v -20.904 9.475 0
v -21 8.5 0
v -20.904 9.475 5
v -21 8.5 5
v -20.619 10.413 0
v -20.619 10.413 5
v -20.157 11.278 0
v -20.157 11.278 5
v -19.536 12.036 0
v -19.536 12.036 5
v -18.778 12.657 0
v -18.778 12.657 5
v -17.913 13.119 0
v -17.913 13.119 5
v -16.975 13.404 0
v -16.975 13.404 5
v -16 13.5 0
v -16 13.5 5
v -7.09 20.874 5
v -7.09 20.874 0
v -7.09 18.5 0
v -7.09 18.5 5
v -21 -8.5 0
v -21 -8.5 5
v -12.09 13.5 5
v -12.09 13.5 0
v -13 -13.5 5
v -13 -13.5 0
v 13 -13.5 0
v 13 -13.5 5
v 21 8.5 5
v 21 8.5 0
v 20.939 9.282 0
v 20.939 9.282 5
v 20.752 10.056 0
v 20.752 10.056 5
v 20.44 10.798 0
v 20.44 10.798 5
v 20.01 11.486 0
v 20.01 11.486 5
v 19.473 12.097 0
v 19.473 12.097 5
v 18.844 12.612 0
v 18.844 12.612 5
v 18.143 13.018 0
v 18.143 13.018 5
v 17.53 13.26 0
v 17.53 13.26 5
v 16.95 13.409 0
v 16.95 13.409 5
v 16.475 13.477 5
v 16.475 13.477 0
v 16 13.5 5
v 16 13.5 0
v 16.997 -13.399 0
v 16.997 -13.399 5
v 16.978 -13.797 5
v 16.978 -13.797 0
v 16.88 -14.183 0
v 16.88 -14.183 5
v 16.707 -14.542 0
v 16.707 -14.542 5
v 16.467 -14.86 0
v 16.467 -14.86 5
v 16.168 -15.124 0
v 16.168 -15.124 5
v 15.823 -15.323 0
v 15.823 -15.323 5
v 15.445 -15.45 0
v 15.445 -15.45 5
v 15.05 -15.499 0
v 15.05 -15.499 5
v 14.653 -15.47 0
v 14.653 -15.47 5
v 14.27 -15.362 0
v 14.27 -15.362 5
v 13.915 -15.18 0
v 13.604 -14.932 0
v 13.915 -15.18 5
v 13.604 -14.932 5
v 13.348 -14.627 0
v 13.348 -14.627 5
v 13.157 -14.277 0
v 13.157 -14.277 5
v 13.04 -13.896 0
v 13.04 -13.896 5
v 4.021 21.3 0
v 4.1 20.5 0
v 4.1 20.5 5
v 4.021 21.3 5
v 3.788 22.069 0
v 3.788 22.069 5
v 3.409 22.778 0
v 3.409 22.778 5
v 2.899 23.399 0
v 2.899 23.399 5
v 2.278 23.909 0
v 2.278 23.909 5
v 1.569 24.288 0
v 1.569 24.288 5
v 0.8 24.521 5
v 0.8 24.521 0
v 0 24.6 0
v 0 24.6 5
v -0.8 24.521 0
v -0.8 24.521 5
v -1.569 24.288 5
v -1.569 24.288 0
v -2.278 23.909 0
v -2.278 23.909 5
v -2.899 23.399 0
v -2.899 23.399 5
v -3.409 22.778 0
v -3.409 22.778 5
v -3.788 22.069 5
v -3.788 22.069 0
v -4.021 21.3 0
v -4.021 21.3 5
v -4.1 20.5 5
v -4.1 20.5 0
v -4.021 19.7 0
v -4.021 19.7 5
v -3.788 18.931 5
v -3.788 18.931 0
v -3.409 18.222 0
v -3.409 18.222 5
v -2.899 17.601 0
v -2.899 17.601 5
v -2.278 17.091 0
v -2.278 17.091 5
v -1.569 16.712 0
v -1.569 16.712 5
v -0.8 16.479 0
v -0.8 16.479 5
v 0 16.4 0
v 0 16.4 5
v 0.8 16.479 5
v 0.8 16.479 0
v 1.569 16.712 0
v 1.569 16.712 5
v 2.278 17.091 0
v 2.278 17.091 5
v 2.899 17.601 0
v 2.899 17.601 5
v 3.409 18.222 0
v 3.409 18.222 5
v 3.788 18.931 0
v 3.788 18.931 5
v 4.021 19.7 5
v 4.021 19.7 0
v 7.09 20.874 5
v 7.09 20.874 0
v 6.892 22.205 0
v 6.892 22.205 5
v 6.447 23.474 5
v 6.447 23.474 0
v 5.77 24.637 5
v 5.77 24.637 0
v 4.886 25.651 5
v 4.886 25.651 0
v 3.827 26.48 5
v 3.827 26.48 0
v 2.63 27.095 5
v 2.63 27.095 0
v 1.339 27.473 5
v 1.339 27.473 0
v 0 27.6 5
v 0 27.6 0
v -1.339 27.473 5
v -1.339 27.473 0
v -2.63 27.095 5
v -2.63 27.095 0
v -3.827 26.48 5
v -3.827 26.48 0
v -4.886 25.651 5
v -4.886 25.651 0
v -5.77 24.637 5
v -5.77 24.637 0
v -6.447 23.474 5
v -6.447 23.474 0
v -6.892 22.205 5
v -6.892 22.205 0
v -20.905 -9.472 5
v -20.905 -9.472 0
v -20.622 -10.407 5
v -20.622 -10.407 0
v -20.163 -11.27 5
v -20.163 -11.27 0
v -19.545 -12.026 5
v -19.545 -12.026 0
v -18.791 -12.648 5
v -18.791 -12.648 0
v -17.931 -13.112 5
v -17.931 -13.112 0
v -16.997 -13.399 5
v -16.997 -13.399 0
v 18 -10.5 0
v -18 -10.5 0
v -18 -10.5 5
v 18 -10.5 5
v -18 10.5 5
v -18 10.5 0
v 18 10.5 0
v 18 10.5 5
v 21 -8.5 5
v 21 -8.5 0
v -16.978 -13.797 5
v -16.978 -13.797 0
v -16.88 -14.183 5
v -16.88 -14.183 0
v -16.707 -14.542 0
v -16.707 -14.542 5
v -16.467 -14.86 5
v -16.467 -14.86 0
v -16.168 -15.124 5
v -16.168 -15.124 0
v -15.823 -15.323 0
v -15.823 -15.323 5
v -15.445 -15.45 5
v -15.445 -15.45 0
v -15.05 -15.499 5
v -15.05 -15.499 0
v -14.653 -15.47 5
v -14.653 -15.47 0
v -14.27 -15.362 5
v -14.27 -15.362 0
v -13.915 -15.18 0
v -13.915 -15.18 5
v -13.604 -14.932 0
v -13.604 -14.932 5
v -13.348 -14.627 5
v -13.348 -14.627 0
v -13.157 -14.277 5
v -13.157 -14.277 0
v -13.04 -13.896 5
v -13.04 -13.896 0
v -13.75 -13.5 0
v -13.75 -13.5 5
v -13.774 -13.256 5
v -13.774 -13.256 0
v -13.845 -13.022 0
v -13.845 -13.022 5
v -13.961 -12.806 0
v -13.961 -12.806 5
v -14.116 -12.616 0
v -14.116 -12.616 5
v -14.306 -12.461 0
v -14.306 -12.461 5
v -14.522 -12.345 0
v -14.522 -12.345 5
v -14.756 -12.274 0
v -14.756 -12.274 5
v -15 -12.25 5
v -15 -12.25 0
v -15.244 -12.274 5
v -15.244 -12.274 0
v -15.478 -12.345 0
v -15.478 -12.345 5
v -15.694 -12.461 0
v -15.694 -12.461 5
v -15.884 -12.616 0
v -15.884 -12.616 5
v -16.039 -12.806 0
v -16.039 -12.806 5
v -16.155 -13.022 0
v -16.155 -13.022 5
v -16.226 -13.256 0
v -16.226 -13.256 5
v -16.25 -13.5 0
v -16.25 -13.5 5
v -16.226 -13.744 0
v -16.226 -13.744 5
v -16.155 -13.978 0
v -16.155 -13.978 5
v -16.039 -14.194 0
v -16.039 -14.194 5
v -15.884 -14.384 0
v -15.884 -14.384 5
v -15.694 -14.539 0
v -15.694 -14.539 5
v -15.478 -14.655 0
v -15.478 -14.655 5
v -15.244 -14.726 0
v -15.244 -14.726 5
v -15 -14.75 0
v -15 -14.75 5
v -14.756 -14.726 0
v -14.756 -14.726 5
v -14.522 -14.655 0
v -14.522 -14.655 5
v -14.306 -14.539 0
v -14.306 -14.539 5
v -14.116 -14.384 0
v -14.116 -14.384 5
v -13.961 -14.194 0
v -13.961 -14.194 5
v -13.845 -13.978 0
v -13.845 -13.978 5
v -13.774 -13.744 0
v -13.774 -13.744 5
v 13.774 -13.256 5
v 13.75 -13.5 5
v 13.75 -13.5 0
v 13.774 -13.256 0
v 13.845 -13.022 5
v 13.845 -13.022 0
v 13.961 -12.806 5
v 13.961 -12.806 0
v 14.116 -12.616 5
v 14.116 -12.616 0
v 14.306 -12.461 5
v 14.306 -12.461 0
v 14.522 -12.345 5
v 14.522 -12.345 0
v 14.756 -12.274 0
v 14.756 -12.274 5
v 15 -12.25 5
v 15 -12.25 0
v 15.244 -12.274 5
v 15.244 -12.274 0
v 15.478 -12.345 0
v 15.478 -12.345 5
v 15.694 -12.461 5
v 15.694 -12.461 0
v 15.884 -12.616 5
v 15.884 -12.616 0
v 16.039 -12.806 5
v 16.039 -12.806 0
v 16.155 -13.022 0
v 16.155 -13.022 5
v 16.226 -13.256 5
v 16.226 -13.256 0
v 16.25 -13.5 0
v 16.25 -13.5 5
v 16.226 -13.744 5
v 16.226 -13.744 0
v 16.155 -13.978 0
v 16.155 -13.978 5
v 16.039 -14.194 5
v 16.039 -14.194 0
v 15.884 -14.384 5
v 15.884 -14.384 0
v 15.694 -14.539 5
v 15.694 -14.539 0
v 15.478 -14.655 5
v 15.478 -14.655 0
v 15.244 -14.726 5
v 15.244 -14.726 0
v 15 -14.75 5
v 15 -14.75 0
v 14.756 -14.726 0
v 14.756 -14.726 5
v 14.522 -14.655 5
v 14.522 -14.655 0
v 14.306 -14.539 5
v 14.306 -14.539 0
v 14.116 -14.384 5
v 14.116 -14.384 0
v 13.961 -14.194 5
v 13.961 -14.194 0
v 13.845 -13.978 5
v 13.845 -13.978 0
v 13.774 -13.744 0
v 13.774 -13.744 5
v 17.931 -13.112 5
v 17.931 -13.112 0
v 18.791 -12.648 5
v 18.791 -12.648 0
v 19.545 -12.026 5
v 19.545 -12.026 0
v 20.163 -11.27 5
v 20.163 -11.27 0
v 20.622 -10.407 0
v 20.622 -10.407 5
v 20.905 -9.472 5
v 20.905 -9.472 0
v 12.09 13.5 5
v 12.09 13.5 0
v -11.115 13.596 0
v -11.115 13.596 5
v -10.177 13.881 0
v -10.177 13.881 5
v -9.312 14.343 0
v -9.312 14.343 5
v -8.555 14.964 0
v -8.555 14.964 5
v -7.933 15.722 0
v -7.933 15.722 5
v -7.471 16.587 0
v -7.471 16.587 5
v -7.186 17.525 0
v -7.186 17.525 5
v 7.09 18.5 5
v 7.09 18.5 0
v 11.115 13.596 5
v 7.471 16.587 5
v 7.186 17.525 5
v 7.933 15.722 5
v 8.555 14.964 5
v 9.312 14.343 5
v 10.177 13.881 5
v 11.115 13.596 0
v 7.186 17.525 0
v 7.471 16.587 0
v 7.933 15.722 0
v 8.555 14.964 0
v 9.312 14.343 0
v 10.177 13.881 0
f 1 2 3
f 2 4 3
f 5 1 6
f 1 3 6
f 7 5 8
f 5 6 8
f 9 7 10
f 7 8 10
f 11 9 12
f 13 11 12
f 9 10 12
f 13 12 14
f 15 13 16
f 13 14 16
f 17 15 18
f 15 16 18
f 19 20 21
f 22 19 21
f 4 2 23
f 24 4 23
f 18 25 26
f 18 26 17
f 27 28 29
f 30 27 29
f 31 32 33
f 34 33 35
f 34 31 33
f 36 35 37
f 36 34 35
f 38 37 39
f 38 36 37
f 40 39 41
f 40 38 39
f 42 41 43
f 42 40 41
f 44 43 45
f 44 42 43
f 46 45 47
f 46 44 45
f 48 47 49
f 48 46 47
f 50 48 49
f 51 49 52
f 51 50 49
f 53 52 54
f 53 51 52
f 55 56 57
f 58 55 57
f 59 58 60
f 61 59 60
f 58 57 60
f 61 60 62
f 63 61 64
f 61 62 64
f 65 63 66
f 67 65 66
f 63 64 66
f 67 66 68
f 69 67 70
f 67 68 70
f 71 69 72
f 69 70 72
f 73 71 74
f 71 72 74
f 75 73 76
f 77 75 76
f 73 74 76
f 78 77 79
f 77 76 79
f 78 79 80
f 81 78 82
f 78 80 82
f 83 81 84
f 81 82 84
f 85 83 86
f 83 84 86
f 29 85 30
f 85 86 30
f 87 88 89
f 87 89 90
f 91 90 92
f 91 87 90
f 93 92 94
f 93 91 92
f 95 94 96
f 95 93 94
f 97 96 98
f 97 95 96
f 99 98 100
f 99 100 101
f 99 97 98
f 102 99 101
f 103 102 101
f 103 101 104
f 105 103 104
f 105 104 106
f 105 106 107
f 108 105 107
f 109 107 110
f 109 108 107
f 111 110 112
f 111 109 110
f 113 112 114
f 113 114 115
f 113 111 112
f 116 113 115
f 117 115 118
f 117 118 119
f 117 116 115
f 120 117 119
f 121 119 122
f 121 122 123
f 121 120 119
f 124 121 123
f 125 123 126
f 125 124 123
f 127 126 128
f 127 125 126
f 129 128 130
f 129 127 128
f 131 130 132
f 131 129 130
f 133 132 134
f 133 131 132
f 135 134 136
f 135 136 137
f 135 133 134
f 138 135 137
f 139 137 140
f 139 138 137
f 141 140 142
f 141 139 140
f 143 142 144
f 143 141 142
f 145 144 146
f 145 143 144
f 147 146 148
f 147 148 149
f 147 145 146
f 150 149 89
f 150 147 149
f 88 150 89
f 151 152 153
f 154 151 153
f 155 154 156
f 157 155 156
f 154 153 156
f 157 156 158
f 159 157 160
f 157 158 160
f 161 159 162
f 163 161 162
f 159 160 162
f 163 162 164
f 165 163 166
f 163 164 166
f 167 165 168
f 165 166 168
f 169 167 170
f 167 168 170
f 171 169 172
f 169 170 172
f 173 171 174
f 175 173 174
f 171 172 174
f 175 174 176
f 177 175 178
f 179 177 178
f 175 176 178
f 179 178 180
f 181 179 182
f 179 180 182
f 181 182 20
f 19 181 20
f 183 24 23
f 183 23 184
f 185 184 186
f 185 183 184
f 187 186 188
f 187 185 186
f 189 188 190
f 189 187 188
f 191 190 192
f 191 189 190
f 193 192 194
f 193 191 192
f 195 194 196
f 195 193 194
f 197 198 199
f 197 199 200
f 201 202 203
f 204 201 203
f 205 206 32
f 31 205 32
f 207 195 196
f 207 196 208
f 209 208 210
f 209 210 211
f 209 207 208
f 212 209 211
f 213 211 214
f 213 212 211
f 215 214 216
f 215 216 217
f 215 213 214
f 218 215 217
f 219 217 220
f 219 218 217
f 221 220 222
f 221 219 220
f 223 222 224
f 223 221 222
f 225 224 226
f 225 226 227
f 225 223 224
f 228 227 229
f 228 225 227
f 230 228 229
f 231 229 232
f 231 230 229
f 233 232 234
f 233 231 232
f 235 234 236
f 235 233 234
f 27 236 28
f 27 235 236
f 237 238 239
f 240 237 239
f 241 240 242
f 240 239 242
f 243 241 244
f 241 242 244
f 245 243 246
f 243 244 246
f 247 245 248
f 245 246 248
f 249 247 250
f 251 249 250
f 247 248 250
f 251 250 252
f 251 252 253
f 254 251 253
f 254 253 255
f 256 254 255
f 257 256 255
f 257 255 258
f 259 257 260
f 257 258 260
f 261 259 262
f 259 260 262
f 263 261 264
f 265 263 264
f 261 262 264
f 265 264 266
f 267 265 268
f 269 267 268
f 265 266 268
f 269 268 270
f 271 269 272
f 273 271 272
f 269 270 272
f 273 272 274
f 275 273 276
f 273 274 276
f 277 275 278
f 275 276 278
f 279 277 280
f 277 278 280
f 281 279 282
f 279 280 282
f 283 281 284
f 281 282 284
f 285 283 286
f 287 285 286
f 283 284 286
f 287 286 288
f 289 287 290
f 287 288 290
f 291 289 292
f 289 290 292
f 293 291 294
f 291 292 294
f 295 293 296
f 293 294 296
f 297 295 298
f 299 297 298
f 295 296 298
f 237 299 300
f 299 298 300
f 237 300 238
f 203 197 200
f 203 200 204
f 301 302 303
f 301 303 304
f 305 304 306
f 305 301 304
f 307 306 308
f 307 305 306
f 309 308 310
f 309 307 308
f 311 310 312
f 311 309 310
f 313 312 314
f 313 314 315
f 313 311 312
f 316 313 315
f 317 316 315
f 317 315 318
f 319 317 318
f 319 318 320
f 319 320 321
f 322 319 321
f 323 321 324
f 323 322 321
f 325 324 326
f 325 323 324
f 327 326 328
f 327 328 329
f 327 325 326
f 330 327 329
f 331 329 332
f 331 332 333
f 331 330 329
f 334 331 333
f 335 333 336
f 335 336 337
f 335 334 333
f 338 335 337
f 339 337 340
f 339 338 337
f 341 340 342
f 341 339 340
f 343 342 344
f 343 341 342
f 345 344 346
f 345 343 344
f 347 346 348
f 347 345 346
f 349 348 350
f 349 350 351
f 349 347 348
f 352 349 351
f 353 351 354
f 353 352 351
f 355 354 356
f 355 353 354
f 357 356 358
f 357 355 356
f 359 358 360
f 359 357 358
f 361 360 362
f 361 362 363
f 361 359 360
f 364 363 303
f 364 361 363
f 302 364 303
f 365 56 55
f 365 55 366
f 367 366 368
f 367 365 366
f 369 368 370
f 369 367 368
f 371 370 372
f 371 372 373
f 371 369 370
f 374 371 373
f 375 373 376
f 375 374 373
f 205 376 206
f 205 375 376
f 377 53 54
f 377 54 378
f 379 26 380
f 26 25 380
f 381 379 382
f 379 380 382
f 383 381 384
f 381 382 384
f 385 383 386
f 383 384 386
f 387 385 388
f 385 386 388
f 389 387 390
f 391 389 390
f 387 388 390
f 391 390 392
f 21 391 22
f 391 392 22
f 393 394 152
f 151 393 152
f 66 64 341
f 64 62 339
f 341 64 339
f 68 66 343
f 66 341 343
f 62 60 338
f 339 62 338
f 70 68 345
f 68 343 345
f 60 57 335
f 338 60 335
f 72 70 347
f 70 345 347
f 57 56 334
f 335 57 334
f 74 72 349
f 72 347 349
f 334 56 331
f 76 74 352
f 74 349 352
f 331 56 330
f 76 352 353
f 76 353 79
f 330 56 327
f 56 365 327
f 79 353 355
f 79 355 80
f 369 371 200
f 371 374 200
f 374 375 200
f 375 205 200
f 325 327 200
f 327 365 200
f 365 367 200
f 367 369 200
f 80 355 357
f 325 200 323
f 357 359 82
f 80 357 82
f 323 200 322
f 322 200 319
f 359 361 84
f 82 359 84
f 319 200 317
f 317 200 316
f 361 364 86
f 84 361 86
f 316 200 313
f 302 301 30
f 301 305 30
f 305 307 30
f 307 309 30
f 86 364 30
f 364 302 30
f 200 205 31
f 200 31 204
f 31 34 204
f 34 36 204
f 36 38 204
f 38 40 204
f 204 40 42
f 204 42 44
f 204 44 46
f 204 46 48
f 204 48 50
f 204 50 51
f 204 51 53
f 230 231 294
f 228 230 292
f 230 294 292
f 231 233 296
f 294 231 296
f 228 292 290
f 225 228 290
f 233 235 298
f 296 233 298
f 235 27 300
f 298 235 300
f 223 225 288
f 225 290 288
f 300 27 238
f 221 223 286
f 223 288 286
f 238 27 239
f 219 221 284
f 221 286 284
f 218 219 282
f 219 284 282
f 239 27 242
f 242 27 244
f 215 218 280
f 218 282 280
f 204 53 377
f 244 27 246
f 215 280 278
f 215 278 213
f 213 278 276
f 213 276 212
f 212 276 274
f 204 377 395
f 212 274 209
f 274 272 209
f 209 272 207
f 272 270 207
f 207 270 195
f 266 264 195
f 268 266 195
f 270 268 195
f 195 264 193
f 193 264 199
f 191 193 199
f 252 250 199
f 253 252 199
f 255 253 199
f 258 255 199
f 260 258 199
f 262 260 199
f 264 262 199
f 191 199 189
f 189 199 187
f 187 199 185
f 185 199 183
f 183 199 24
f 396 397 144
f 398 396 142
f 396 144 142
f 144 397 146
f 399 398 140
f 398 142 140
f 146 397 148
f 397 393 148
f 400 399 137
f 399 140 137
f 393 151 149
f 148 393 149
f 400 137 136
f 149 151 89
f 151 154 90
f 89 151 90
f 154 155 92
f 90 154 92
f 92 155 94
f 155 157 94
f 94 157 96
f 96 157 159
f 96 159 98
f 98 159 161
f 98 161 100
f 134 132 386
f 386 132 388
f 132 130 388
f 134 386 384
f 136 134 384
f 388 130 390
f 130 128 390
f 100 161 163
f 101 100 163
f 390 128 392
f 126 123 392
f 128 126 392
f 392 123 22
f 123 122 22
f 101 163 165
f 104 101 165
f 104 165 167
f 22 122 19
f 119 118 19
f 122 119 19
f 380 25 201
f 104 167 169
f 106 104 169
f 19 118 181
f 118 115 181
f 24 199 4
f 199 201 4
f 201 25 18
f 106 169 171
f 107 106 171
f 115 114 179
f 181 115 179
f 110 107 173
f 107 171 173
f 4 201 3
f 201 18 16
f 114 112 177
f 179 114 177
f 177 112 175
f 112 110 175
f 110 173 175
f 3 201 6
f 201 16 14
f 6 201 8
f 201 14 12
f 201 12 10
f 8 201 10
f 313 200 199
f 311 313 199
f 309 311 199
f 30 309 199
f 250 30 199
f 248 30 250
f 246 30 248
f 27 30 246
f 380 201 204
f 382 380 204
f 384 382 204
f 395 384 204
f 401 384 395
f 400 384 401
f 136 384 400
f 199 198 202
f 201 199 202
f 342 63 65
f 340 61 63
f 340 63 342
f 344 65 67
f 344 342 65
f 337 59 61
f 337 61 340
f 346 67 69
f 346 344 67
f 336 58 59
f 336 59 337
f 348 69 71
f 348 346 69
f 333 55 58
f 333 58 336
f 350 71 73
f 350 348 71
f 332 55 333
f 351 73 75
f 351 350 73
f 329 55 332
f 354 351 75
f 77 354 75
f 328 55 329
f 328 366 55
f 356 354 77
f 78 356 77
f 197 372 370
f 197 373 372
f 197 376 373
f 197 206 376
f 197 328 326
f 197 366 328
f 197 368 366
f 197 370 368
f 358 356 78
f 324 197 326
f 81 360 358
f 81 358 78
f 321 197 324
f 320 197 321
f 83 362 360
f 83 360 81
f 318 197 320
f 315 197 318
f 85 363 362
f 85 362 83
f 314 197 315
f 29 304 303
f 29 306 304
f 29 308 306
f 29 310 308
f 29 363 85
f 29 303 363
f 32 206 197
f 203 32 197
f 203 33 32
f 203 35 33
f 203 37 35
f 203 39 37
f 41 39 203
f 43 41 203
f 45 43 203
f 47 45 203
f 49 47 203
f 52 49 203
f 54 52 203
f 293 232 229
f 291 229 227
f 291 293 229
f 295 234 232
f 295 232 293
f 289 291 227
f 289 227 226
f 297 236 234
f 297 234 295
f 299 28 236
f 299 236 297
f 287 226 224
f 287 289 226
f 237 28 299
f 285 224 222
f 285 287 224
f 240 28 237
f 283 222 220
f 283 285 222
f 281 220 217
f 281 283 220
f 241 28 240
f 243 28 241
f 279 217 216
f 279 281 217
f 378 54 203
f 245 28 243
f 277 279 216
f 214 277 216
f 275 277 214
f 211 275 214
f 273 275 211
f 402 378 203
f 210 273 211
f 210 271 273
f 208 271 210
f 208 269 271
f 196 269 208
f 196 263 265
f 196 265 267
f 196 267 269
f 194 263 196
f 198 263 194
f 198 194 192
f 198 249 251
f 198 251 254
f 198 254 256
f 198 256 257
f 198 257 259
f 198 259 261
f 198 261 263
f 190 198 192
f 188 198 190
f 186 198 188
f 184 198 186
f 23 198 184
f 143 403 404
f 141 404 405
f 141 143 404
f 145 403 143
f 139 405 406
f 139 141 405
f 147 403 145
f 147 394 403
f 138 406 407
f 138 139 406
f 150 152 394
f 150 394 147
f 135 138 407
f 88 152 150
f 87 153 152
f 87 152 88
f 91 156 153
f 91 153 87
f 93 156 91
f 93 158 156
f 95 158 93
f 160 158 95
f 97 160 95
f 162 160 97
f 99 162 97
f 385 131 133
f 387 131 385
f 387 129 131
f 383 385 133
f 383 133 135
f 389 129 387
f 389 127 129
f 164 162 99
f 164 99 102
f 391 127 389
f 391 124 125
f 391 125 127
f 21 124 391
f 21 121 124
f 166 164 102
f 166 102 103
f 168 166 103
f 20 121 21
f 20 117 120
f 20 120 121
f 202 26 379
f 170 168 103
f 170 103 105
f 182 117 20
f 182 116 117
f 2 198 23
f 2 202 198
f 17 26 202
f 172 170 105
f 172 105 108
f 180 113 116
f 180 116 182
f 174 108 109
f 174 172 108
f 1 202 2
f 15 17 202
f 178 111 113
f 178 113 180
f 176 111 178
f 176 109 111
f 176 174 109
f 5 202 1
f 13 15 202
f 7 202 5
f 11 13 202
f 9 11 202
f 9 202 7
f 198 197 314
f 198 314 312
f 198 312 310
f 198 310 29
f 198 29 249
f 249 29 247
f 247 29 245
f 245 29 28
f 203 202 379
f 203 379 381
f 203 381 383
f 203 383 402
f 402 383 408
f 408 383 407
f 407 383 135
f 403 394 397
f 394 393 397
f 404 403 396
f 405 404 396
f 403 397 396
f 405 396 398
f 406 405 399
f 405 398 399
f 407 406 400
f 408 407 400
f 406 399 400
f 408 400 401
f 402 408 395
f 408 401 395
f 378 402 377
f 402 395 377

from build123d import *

# Parameters (mm, degrees)
F0_W     = 36
F0_H     = 21
F0_R     = 4.1
F1_DEPTH = 5
F2_R     = 5
F4_DEPTH = 5
F5_R     = 1.25
F6_DEPTH = 5


# Not quite as in the source:
# - a pattern or mirror of a feature is missing from the dataset's text; its kind, count and spacing are read off the source's solid


with BuildPart() as f1:
    # F0 (on Top) → F1 (new body)
    with BuildSketch(Plane.XY):
        with BuildLine():
            Line((-21, 13.5), (-21, 10.5))
            Line((-21, 10.5), (-21, -13.5))
            Line((-21, -13.5), (21, -13.5))
            Line((21, -13.5), (21, 10.5))
            Line((21, 10.5), (21.0088081658, 13.5))
            Line((21.0088081658, 13.5), (7.0901421979, 13.5))
            Line((7.0901421979, 13.5), (7.0901421979, 20.8740101776))
            ThreePointArc((7.0901421979, 20.8740101776), (0, 27.6), (-7.0901421979, 20.8740101776))
            Line((-7.0901421979, 20.8740101776), (-7.0901421979, 13.5))
            Line((-7.0901421979, 13.5), (-21, 13.5))
        make_face()
        Rectangle(F0_W, F0_H, mode=Mode.SUBTRACT)
        with Locations((0, 20.5)):
            Circle(F0_R, mode=Mode.SUBTRACT)
    extrude(amount=F1_DEPTH)

    # F2
    f2_edges = [f1.edges().sort_by_distance(p)[0] for p in [
        (-7.090142, 13.5, 2.5),
        (7.090142, 13.5, 2.5),
        (21.008808, 13.5, 2.5),
        (-21, 13.5, 2.5),
        (-21, -13.5, 2.5),
        (21, -13.5, 2.5),
    ]]
    fillet(f2_edges, radius=F2_R)

    # F3 (on face) → F4 (join, through all)
    with BuildSketch(Plane.XY.offset(5)):
        with BuildLine():
            ThreePointArc((-16.9974730705, -13.3994946141), (-15.0502685736, -15.4993681678), (-13, -13.5))
            Line((-13, -13.5), (-16, -13.5))
            ThreePointArc((-16, -13.5), (-16.5012618724, -13.4748102009), (-16.9974730705, -13.3994946141))
        make_face()
    f4 = extrude(amount=-F4_DEPTH)

    # F4_copies: F4 across plane
    add(f4.mirror(Plane(origin=(0, 0, 0), x_dir=(0, 0, 1), z_dir=(1, 0, 0))))

    # F5 (on face) → F6 (cut, through all)
    with BuildSketch(Plane.XY.offset(5)):
        with Locations((-15, -13.5)):
            Circle(F5_R)
    f6 = extrude(amount=-F6_DEPTH, mode=Mode.SUBTRACT)

    # F6_copies: F6 across plane
    add(f6.mirror(Plane(origin=(0, 0, 0), x_dir=(0, 0, 1), z_dir=(1, 0, 0))), mode=Mode.SUBTRACT)


solid = f1.part
